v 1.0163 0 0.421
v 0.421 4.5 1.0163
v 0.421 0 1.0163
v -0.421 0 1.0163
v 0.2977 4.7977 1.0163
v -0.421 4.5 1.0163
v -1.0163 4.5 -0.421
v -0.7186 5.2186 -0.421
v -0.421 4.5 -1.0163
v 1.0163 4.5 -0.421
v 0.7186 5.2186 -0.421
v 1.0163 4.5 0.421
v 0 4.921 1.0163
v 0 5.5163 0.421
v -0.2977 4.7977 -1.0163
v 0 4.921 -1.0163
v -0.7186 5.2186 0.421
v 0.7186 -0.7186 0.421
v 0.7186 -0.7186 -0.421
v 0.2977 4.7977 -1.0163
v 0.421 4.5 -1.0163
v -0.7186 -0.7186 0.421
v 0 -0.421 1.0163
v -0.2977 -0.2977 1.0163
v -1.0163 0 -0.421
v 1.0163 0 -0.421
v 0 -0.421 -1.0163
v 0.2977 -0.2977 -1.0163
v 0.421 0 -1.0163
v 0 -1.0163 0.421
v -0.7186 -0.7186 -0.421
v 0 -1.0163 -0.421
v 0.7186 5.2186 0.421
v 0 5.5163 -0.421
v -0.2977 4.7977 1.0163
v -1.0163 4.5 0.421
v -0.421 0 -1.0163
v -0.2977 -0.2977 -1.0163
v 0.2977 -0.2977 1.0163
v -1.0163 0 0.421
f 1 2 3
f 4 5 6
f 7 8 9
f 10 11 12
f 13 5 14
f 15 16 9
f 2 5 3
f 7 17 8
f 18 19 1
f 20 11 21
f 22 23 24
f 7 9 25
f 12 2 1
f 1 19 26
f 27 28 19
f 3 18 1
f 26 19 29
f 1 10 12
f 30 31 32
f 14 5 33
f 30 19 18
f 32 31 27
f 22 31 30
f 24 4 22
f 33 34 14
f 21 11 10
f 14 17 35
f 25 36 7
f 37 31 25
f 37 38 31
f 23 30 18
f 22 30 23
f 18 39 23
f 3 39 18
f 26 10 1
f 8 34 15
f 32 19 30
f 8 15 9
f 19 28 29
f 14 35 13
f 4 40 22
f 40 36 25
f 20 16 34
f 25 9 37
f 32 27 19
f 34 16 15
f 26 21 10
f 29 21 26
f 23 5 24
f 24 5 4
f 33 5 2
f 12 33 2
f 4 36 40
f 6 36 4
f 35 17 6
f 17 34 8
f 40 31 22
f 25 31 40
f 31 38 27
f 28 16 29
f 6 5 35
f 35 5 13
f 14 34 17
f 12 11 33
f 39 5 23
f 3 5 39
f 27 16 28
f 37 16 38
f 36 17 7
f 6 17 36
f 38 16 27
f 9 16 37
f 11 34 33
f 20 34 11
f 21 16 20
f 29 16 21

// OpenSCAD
module rod(a, b, r) {
        hull() {
            translate(a) sphere(r,$fn=8);
            translate(b) sphere(r,$fn=8);
        }
    }

rod([0,0,0],[0,4.5,0],1.1);
